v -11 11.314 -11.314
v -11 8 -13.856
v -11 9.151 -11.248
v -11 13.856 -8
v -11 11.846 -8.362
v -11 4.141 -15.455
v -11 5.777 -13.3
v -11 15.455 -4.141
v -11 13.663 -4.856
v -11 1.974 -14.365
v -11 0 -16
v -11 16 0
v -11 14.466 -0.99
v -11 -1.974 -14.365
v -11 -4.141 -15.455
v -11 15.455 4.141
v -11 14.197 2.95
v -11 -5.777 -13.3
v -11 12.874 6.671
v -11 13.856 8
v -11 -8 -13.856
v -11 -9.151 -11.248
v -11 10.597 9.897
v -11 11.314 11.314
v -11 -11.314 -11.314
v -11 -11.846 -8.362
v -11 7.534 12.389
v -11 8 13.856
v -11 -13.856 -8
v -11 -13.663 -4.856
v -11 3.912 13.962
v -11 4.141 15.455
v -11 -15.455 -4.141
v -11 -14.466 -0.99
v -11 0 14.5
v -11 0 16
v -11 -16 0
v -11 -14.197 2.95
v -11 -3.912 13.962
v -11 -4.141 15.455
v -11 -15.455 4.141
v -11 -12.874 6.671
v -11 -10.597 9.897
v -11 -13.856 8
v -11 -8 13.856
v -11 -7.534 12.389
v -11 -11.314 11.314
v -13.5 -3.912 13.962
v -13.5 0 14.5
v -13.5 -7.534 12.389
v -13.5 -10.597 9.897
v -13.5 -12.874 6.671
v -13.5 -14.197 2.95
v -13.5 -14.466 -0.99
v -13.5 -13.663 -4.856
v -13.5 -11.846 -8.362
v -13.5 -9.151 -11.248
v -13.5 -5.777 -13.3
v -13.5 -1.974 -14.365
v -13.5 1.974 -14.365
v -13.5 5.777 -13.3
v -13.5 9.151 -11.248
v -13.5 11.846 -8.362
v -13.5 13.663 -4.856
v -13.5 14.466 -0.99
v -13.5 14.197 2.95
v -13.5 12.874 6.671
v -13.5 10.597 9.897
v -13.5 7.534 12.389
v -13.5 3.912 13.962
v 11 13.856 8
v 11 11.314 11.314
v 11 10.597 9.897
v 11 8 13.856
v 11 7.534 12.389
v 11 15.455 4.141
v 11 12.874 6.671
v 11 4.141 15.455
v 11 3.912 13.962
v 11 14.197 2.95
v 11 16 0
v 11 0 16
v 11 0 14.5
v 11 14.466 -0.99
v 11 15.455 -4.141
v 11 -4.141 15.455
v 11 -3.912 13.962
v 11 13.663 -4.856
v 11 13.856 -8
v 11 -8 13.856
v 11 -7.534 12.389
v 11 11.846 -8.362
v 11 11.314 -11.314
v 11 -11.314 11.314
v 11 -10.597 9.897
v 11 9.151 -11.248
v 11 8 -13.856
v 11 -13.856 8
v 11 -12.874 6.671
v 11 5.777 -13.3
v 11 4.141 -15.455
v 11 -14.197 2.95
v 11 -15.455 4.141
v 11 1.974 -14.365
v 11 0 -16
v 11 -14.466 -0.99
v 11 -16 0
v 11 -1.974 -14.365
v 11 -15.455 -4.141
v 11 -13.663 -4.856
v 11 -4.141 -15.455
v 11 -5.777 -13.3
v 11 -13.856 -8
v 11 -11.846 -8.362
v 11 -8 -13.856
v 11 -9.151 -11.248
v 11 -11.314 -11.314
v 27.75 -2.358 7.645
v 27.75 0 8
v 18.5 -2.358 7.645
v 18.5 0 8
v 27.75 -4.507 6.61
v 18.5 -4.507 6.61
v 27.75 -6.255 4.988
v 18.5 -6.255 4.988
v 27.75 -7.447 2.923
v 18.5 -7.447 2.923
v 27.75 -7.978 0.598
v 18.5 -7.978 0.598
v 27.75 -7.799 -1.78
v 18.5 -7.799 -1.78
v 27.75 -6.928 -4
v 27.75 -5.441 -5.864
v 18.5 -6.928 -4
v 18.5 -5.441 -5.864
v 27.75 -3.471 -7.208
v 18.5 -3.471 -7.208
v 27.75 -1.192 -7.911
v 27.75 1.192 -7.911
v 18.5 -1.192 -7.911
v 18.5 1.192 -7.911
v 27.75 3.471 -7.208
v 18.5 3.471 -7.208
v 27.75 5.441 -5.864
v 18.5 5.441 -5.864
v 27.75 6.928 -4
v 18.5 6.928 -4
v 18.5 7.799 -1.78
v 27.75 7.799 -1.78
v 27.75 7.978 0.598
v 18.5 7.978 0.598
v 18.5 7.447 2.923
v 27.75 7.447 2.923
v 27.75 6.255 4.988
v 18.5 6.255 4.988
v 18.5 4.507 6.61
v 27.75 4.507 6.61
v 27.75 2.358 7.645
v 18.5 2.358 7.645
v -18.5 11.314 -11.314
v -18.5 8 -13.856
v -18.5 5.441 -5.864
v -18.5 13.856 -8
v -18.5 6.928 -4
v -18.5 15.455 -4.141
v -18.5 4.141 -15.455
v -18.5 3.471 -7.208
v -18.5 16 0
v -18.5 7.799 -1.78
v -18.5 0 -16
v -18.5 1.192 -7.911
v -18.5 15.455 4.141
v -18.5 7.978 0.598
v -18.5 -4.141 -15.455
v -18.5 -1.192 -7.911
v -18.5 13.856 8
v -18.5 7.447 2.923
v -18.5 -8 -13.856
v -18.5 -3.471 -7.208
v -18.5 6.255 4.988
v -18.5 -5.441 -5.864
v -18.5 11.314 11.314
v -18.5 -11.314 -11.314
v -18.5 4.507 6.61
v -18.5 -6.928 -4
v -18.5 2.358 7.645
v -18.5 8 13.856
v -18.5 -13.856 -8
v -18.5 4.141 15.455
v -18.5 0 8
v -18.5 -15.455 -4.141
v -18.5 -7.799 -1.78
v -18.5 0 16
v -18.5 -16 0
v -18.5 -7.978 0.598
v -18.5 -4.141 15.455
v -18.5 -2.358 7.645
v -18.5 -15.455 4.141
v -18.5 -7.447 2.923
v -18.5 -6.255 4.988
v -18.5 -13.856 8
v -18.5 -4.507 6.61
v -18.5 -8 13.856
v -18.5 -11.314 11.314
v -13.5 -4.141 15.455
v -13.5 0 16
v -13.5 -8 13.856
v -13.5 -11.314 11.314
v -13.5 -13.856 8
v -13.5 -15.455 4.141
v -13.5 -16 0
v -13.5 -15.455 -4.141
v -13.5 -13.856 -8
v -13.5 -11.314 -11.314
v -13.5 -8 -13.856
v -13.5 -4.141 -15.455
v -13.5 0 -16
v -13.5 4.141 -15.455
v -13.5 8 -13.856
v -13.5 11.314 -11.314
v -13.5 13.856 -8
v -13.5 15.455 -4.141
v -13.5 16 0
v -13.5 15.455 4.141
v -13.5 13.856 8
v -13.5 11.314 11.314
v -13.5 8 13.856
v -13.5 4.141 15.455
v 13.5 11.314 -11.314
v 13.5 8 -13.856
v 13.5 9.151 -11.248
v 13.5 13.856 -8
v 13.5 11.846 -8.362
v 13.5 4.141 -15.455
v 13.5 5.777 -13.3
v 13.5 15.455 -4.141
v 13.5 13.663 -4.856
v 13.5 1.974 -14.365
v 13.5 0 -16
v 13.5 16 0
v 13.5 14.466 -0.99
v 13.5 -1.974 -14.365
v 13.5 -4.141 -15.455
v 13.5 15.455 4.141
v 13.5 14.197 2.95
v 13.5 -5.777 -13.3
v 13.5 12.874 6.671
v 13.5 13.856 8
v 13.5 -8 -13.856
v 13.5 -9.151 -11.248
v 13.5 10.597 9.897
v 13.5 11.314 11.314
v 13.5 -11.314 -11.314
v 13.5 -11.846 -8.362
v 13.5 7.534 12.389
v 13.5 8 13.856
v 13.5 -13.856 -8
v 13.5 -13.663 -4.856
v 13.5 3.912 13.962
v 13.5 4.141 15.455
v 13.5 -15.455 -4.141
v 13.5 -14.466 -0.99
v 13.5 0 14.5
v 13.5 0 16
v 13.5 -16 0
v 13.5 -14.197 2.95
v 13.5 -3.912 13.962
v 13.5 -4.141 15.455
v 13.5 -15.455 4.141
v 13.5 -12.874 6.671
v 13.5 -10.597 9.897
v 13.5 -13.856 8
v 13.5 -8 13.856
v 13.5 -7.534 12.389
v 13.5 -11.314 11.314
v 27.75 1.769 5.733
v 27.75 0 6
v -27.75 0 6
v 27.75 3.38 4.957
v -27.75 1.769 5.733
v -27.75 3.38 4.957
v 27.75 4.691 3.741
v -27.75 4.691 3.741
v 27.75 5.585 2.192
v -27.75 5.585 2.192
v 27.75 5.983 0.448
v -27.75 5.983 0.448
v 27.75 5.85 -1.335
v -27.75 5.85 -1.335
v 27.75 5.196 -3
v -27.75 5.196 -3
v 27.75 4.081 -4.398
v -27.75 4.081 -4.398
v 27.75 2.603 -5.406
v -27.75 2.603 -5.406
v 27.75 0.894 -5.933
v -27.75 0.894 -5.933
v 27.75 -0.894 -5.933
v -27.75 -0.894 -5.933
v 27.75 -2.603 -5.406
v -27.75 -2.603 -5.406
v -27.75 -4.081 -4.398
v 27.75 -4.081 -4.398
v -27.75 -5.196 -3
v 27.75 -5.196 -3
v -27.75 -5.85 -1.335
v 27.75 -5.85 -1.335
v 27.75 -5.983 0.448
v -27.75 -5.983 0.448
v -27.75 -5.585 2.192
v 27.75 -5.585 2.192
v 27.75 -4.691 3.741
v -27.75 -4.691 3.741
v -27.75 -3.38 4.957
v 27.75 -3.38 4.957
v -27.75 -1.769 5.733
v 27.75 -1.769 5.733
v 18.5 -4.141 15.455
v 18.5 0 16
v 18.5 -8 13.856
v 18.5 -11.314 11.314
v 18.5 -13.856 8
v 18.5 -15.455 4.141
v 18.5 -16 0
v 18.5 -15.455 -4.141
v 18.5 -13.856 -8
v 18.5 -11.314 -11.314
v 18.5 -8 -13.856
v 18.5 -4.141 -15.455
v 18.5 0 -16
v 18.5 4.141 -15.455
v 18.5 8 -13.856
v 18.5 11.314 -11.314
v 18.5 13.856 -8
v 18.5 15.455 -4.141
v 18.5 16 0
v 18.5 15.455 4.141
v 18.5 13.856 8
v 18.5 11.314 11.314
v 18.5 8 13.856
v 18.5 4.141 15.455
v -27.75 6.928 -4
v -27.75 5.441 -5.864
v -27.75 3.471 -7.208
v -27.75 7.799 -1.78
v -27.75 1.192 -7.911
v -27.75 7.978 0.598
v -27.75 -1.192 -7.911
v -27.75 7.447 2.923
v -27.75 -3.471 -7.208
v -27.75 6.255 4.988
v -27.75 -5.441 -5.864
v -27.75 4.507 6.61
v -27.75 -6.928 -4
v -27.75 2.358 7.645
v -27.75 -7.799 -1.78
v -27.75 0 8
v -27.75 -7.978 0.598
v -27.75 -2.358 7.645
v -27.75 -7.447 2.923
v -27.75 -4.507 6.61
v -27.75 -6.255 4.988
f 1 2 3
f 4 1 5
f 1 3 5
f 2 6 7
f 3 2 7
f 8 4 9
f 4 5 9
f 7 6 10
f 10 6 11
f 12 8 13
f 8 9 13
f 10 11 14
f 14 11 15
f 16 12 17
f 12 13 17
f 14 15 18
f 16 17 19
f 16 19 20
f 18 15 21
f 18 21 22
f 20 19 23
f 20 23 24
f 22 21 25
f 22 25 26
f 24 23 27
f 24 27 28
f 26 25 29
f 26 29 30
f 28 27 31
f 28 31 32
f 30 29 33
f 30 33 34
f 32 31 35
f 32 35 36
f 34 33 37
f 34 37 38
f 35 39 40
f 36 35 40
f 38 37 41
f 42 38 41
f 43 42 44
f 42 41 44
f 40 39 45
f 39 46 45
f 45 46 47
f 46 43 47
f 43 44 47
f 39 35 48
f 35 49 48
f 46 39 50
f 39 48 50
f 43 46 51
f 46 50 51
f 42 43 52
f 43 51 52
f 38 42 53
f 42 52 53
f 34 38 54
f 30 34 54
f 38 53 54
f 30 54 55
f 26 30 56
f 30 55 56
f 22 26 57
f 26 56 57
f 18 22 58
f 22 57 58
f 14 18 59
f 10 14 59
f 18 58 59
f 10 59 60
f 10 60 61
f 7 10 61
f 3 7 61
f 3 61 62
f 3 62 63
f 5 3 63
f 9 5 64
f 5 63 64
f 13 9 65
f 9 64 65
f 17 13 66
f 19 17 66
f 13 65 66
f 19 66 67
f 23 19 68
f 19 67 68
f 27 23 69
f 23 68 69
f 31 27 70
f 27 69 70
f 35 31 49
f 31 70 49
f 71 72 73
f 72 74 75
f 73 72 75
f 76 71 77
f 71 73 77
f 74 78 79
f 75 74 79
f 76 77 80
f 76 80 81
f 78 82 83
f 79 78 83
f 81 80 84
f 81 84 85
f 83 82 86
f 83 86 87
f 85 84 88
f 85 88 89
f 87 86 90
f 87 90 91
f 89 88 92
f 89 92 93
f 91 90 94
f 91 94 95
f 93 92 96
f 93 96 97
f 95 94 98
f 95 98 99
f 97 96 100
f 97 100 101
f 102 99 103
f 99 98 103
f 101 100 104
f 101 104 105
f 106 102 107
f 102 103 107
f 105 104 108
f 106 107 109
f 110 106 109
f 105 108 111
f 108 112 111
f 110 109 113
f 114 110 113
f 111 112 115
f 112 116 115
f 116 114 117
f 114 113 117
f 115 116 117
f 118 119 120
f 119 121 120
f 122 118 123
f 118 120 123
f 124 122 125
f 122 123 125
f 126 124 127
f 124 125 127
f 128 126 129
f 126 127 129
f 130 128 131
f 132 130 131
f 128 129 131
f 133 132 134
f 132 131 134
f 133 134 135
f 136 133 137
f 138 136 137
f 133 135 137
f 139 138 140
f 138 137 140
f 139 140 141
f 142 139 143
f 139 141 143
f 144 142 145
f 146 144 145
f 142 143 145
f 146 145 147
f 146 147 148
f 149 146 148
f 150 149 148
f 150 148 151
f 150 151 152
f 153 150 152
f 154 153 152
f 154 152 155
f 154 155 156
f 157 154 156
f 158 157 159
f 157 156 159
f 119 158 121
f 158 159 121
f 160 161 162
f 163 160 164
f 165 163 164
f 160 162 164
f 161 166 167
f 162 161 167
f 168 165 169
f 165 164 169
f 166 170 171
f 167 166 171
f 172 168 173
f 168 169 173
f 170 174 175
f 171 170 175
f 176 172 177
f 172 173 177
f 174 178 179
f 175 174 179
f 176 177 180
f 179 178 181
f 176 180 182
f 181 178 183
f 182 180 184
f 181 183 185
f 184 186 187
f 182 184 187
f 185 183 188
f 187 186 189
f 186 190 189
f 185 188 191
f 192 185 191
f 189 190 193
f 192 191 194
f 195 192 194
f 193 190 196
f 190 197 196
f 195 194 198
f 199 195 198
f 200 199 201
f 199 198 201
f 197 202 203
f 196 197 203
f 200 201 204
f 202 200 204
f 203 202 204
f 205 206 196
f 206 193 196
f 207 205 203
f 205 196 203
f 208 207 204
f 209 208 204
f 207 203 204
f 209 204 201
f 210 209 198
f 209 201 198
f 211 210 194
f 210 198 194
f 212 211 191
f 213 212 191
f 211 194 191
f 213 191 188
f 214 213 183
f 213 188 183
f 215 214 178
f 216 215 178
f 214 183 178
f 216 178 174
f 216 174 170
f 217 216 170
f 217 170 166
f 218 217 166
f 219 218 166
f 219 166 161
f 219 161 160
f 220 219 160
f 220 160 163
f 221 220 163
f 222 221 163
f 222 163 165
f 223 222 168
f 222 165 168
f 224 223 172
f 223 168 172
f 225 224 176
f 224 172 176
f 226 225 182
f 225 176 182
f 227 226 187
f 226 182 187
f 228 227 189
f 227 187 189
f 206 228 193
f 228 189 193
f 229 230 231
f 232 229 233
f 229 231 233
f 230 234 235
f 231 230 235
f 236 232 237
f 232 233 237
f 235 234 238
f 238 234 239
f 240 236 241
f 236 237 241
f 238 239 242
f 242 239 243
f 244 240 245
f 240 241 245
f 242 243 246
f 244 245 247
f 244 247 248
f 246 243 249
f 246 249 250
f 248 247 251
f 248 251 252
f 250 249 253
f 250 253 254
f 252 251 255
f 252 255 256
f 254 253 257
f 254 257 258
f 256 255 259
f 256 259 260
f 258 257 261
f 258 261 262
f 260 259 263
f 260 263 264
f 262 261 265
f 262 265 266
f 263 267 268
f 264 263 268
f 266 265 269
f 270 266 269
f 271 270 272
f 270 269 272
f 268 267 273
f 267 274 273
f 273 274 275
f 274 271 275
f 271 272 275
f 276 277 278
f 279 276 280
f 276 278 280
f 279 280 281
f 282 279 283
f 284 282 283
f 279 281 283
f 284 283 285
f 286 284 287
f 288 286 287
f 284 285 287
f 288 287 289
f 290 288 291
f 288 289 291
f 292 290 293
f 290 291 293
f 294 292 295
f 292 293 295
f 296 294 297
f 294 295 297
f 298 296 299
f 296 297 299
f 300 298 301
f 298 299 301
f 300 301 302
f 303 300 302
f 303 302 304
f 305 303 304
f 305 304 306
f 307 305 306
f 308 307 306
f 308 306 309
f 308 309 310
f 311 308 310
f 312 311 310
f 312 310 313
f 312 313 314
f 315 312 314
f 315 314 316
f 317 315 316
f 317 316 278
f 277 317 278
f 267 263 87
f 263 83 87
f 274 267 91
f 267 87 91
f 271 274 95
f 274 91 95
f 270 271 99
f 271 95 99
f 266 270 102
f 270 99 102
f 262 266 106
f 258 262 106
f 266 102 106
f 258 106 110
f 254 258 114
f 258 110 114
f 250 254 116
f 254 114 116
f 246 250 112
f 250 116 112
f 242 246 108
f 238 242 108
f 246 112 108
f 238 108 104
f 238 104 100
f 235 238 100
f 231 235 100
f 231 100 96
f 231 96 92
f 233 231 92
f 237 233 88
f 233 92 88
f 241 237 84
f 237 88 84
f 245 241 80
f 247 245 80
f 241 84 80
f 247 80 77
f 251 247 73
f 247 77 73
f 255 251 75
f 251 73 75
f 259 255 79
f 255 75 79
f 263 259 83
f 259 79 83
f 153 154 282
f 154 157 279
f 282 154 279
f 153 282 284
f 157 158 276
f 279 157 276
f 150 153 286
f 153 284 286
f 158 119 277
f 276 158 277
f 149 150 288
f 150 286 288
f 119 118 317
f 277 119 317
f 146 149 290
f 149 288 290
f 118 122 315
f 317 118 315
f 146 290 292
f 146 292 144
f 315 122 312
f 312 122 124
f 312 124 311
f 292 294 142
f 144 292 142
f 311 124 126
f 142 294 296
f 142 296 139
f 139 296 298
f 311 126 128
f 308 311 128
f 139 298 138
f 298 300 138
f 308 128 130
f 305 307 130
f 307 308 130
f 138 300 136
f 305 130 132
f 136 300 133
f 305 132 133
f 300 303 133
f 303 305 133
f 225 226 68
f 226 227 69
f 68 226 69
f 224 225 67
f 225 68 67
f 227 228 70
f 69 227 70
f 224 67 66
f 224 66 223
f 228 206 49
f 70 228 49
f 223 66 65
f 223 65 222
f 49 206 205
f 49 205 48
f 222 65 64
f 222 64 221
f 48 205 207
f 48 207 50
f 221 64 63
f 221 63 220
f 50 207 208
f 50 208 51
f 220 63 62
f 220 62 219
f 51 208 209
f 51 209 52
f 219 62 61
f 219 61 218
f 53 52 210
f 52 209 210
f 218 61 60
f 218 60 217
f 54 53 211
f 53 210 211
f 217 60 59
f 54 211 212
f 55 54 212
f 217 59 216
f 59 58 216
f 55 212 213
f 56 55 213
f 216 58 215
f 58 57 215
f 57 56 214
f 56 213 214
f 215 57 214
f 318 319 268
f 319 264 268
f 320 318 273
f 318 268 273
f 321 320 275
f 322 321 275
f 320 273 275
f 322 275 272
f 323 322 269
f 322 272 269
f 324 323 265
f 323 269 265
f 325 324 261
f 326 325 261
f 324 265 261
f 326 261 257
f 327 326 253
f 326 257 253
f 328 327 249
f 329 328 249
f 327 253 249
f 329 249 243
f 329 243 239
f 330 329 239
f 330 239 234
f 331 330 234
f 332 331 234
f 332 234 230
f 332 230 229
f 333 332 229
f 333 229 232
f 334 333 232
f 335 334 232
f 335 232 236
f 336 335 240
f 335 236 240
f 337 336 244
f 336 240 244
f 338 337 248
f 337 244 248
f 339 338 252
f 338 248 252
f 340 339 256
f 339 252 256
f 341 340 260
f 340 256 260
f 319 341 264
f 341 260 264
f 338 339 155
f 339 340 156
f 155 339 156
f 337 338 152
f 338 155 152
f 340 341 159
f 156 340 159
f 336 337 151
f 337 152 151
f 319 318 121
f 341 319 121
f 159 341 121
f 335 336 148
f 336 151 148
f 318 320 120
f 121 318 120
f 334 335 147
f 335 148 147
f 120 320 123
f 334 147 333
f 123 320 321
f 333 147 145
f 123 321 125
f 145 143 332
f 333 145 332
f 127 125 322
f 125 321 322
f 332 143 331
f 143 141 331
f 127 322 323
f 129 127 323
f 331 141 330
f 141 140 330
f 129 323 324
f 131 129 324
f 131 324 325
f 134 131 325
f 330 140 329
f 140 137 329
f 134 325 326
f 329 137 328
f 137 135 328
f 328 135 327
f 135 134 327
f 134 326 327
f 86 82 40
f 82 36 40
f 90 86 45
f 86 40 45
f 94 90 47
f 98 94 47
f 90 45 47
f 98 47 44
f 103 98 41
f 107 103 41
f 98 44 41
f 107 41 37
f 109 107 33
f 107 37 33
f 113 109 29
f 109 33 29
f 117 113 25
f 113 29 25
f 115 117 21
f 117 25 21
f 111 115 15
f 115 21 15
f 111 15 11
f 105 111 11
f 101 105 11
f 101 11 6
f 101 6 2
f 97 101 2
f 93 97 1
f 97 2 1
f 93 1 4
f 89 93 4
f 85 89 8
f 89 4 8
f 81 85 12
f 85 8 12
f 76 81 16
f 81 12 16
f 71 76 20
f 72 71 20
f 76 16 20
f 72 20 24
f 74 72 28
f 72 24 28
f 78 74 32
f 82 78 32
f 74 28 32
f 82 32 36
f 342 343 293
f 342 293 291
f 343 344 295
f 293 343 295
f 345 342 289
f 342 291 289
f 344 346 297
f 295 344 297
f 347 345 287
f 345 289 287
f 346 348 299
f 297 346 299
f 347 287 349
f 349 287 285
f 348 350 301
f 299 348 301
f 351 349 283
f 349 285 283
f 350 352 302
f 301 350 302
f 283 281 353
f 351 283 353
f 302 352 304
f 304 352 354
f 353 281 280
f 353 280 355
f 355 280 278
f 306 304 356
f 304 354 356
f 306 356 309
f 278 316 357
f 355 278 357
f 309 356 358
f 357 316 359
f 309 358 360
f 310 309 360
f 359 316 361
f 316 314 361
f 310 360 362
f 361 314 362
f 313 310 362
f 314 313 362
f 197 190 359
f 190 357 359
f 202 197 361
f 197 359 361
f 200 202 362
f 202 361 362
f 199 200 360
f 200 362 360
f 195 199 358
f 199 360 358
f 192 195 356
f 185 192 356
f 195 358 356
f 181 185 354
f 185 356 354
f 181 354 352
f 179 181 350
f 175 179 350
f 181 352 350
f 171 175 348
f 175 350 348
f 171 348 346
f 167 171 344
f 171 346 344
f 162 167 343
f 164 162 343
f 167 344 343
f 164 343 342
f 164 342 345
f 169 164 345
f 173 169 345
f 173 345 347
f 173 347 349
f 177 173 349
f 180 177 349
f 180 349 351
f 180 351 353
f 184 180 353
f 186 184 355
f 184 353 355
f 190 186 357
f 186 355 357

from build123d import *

# Parameters (mm, degrees)
CROQUIS3_R            = 6
CORTAR_EXTRUIR1_DEPTH = 60.935381871


with BuildPart() as part:
    # Croquis2 → Revolución1 (revolve)
    with BuildSketch(Plane.XY, mode=Mode.PRIVATE) as revoluci_n1_sk:
        Polygon((0, 0), (18.5, 0), (27.75, 0), (27.75, 8), (18.5, 8), (18.5, 16), (13.5, 16), (13.5, 14.5), (11, 14.5), (11, 16), (-11, 16), (-11, 14.5), (-13.5, 14.5), (-13.5, 16), (-18.5, 16), (-18.5, 8), (-27.75, 8), (-27.75, 0), (-12.75, 0), align=None)
    revolve(revoluci_n1_sk.sketch.rotate(Axis((-12.75, 0, 0), (1, 0, 0)), 90), axis=Axis((-12.75, 0, 0), (1, 0, 0)))

    # Croquis3 → Cortar-Extruir1 (cut, through all)
    with BuildSketch(Plane.ZY.offset(27.75)):
        Circle(CROQUIS3_R)
    extrude(amount=-CORTAR_EXTRUIR1_DEPTH, mode=Mode.SUBTRACT)


solid = part.part
